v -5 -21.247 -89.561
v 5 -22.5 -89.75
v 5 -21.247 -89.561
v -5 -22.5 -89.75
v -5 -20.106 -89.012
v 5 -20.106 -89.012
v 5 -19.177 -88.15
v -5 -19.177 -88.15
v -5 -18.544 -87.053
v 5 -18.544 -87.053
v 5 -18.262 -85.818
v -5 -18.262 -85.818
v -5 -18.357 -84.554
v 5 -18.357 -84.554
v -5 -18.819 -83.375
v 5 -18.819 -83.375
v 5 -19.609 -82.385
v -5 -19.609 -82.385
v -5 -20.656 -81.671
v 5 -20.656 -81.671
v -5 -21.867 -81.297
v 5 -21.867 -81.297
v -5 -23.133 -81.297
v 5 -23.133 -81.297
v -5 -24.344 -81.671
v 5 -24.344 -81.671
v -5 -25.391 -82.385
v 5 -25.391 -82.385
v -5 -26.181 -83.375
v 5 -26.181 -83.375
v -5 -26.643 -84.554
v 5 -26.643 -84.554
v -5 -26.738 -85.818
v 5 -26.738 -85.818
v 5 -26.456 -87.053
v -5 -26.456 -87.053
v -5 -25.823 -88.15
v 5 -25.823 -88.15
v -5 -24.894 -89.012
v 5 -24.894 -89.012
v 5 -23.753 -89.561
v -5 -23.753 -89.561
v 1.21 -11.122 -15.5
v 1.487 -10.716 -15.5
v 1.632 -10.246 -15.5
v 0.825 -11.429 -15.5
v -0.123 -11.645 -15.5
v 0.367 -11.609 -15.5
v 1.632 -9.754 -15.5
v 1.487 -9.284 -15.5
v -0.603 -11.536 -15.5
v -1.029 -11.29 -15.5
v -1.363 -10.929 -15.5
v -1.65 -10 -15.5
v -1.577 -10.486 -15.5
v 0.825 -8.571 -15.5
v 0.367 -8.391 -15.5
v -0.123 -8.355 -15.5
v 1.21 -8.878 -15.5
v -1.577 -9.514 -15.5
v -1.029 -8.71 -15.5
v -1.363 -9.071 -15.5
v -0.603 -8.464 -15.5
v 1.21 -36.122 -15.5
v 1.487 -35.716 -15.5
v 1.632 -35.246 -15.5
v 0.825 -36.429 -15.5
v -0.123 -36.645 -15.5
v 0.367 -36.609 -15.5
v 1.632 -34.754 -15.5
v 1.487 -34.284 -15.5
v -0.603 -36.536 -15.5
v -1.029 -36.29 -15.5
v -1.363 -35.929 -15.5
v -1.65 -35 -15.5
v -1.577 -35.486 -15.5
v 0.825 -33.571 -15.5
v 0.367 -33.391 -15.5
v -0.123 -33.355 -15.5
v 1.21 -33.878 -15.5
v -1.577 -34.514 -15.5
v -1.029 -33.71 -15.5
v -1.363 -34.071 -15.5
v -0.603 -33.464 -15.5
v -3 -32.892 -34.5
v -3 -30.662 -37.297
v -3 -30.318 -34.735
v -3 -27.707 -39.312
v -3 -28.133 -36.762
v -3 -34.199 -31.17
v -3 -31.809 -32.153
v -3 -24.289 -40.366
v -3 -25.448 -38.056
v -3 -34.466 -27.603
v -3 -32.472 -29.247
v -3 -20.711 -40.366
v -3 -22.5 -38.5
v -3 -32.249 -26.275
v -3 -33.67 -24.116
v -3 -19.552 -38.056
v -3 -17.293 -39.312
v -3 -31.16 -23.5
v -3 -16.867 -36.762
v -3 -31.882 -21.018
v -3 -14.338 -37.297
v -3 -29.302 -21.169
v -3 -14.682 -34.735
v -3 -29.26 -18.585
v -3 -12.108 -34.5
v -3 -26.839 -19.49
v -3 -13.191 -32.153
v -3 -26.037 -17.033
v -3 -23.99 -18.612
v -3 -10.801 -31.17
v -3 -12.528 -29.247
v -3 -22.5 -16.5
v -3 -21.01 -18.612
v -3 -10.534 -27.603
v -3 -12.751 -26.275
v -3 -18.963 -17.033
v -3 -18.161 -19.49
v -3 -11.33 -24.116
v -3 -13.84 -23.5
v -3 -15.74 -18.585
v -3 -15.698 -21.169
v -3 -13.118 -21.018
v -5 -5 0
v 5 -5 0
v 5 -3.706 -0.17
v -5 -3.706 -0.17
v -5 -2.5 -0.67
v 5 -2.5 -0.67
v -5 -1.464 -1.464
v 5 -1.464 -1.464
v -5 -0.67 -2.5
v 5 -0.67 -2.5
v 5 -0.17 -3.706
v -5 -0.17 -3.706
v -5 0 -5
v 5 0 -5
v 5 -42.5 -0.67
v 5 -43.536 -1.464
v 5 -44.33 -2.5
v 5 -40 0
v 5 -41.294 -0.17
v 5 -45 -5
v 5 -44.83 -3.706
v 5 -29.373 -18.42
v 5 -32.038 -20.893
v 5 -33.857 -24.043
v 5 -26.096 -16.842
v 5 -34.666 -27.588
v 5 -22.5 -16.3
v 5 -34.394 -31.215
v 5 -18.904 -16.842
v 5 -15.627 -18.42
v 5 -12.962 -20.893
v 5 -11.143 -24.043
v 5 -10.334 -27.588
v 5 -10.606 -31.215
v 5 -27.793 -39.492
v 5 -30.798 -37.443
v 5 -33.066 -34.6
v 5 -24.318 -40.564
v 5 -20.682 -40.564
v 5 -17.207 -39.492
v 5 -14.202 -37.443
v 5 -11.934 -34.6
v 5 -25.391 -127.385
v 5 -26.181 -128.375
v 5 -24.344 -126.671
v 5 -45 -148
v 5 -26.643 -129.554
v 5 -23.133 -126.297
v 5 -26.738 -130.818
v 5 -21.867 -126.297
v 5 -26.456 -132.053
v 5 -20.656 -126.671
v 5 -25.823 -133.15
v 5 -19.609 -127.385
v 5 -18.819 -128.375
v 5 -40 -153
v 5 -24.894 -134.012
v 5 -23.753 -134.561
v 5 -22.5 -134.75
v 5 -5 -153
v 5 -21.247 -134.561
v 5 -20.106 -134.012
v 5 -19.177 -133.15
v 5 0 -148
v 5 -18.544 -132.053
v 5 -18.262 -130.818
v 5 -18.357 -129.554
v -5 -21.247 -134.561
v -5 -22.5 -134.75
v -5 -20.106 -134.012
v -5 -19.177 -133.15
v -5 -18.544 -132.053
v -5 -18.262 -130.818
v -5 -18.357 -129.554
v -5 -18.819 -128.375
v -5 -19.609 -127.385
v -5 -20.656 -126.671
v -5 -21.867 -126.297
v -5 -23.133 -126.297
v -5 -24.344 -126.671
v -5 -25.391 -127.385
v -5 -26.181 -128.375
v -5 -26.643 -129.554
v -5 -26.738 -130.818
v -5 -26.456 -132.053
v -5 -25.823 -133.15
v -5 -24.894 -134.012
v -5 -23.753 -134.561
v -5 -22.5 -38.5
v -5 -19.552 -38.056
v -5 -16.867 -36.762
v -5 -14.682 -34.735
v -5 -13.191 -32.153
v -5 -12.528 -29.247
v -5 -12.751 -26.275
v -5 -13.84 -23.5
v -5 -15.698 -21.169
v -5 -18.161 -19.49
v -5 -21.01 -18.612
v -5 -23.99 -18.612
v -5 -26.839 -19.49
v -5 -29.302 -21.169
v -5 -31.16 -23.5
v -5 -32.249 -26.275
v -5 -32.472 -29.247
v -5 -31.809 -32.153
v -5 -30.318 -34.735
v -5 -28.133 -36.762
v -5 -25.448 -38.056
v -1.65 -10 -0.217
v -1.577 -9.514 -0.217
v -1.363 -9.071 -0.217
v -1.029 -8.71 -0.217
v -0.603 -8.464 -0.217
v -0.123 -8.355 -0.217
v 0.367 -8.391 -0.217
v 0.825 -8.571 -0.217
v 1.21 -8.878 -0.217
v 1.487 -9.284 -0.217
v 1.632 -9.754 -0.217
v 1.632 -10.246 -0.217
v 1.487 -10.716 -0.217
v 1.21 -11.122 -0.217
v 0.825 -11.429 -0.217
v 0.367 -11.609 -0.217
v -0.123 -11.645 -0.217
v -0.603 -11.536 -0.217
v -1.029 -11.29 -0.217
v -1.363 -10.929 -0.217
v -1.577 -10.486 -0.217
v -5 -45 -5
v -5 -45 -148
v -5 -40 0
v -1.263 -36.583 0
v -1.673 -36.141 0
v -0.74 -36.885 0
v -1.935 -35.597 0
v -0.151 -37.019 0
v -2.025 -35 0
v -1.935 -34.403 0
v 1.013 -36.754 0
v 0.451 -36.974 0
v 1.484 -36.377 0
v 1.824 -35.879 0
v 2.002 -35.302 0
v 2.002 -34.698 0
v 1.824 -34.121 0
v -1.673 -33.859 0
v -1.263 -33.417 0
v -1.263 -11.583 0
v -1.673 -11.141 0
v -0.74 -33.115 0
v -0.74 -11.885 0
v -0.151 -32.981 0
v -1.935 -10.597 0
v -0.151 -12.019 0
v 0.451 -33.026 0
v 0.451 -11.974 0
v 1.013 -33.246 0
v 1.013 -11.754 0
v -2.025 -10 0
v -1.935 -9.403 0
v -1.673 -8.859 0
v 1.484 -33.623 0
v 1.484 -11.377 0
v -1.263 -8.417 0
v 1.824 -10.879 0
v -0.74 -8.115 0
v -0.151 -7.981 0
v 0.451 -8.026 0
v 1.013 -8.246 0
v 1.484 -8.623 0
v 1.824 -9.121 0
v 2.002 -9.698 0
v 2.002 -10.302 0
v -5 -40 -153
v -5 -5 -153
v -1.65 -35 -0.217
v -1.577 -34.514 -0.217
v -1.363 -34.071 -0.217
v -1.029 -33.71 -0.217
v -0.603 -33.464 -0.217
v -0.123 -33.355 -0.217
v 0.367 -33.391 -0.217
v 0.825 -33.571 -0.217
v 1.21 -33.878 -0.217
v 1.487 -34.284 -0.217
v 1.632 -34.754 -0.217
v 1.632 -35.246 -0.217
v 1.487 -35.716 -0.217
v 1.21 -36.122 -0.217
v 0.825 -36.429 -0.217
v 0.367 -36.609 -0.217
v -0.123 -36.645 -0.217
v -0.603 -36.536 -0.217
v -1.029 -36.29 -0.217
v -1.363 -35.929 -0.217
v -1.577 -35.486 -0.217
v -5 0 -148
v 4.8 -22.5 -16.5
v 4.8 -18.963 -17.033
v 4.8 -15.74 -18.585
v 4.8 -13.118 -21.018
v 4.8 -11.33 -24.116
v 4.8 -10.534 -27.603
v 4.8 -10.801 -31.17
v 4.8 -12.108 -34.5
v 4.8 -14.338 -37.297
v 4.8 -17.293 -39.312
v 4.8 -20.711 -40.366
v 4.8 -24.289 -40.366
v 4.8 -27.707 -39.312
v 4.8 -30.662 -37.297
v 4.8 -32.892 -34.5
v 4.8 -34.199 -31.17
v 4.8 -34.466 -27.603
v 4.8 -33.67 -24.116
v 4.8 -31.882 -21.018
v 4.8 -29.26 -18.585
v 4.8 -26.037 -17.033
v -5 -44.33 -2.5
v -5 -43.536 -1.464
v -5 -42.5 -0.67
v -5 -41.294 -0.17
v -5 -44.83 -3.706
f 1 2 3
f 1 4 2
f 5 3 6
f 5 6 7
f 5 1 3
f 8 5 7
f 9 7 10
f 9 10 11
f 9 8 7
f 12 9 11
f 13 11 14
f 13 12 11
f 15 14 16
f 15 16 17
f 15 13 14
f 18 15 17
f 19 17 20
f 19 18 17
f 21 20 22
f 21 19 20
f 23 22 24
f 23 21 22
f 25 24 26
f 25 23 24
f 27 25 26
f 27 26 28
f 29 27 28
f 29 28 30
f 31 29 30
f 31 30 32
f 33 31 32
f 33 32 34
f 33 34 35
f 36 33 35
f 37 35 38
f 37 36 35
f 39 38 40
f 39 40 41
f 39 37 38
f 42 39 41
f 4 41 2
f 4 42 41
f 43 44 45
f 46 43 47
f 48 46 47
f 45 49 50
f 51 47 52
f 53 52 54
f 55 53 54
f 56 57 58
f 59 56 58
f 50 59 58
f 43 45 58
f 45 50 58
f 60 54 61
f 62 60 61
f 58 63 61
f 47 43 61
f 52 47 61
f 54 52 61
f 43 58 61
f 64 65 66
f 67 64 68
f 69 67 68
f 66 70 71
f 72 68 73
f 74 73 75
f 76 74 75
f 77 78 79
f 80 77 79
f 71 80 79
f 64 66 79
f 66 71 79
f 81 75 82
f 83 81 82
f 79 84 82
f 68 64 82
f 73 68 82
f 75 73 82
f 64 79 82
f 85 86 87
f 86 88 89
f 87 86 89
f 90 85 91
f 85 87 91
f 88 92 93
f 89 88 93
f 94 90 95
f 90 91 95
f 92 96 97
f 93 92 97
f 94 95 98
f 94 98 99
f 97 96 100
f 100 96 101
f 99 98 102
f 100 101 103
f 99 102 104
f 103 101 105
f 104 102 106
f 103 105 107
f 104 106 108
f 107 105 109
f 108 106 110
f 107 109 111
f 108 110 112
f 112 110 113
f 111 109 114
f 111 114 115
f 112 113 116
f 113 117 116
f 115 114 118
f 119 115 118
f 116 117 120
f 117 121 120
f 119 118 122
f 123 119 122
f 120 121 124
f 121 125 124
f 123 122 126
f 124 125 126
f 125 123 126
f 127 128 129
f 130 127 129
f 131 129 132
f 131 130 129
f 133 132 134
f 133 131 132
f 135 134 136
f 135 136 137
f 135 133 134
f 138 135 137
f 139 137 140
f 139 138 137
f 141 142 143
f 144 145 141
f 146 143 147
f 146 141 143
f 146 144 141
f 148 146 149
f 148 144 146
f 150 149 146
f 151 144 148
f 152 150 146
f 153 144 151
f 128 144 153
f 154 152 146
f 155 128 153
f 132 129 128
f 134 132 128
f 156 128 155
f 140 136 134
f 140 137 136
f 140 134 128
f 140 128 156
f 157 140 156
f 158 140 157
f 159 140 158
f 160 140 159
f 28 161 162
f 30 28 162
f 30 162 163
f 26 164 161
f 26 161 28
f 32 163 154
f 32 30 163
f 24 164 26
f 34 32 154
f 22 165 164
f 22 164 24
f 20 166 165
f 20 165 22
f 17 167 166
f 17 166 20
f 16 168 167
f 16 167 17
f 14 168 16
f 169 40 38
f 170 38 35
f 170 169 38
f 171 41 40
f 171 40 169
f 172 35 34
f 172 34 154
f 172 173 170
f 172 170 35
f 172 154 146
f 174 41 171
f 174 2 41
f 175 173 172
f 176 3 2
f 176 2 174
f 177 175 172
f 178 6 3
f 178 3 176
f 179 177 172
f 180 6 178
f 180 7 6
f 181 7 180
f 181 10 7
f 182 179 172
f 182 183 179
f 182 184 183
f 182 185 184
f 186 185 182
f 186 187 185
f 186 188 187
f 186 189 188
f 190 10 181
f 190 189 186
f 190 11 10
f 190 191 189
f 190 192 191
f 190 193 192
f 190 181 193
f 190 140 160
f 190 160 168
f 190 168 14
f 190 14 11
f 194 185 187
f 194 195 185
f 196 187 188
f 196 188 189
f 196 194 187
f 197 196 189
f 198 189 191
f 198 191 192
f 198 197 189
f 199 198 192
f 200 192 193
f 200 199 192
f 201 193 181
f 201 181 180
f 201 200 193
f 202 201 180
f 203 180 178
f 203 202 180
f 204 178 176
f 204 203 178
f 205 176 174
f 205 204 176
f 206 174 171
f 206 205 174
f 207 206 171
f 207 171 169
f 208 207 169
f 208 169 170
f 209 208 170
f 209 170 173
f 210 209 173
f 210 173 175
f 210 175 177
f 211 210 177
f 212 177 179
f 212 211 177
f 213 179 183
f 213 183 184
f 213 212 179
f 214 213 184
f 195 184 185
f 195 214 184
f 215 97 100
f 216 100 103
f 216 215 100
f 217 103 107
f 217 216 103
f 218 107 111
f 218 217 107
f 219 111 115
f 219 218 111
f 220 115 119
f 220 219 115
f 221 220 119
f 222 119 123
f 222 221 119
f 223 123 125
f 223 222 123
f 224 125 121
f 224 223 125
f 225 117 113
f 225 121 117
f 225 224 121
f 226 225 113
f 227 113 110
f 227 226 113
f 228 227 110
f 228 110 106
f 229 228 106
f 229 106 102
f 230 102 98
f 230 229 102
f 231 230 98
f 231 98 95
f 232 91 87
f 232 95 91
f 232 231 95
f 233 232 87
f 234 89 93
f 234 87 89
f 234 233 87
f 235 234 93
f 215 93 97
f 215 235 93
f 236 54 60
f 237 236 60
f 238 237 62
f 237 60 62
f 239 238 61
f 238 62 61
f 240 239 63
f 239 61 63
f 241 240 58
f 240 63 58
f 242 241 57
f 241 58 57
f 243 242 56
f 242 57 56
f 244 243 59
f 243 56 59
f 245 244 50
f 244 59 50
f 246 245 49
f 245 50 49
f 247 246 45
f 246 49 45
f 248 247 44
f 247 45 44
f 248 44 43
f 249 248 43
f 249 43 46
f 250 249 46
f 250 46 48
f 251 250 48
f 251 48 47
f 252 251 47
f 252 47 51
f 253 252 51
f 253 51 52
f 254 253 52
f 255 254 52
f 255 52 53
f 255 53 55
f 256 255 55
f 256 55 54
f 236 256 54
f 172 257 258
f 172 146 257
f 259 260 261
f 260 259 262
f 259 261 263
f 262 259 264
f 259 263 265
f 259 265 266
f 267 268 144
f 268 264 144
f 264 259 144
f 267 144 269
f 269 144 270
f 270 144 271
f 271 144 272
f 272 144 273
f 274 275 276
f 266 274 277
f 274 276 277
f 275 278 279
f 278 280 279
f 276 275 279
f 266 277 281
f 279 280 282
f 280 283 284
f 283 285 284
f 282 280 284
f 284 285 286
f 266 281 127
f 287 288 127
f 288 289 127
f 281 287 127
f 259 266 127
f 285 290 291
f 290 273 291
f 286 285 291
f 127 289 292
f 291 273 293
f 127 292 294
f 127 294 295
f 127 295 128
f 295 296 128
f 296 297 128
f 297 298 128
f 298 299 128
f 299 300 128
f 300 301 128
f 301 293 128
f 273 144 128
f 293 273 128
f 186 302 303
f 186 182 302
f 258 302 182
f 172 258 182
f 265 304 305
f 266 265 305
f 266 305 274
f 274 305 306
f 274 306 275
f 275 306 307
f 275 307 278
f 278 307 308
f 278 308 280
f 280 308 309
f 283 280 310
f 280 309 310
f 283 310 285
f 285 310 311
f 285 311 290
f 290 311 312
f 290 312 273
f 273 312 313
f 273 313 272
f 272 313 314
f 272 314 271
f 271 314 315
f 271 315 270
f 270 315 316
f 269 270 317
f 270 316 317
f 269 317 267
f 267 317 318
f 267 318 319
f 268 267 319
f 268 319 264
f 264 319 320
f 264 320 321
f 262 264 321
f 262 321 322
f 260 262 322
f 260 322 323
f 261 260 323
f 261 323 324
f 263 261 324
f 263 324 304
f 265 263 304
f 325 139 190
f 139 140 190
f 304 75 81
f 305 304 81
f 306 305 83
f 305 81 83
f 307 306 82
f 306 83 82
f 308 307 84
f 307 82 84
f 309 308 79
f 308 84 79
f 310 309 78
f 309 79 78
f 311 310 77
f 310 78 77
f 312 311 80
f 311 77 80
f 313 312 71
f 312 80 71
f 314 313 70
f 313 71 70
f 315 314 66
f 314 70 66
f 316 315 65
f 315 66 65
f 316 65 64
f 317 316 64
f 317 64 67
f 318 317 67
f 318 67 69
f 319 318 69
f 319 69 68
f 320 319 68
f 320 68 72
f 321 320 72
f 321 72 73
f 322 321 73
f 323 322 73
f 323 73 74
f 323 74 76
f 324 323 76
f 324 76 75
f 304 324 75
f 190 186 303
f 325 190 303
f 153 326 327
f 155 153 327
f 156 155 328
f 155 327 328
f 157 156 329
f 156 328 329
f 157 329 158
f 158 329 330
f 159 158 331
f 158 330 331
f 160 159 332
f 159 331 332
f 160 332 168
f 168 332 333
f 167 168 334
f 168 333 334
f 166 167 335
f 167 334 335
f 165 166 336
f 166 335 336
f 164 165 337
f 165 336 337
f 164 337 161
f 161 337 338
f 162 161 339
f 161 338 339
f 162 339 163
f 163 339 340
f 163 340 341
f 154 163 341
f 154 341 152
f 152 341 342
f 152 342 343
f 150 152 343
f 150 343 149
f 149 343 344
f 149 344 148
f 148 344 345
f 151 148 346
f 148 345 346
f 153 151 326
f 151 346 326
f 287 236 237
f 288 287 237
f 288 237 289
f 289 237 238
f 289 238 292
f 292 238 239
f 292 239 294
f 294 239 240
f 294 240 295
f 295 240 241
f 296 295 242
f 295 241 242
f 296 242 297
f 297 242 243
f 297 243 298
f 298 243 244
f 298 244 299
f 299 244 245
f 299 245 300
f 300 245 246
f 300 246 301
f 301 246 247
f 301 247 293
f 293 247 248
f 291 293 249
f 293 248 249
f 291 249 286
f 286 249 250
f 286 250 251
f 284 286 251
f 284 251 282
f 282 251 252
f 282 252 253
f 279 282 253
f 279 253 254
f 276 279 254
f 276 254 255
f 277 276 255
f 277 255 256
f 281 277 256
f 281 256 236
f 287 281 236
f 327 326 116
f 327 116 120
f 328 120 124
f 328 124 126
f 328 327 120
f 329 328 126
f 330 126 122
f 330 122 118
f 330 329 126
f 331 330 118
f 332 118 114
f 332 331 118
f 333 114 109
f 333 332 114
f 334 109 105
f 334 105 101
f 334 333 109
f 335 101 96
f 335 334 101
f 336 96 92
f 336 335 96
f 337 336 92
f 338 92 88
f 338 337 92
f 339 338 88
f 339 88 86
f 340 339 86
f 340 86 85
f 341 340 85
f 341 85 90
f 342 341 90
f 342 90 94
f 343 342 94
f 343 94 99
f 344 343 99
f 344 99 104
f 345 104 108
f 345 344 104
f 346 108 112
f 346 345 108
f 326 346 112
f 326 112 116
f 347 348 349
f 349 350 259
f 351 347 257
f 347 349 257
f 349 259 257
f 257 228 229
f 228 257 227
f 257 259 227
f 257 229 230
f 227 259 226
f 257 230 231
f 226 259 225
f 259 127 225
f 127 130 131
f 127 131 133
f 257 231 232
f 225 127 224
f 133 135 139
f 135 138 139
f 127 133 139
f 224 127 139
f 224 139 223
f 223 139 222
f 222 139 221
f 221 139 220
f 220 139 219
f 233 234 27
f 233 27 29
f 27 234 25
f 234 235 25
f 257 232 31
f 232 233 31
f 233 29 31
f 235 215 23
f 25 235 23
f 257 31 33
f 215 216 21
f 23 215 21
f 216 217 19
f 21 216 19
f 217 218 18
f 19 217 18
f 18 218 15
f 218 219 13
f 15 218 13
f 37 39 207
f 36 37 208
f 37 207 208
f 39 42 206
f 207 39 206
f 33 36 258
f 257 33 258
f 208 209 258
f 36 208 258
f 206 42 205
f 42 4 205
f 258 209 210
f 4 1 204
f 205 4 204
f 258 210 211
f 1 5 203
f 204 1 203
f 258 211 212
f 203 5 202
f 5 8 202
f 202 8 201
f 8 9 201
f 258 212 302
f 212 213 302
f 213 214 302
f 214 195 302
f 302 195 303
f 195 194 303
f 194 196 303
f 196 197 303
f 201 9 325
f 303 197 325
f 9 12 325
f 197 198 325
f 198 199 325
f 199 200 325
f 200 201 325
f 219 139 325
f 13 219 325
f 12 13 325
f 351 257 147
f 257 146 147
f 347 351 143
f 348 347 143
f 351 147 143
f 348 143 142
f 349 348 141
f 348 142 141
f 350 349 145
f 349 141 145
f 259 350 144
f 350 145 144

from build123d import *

# Parameters (mm, degrees)
SKETCH_1_W                   = 153
SKETCH_1_H                   = 45
SKETCH_1_R                   = 10
SKETCH_1_R_2                 = 4.25
EXTRUDE_1_DEPTH              = 5
SKETCH_6_R                   = 12
CUT_EXTRUDE_1028_DEPTH       = 8
CHAMFER_1_SIZE               = 5
FILLET_1_R                   = 5
CHAMFER_2_SIZE               = 0.2
HOLE_WIZARD_M4_1_D           = 3.3
HOLE_WIZARD_M4_1_DEPTH       = 15.5
HOLE_WIZARD_M4_1_CSINK_D     = 4.05
HOLE_WIZARD_M4_1_CSINK_ANGLE = 120


with BuildPart() as part:
    # 草图1 → 凸台-拉伸1 (new body, symmetric)
    with BuildSketch(Plane(origin=(0, 0, 0), x_dir=(0, 0, -1), z_dir=(1, 0, 0))):
        with Locations((76.5, -22.5)):
            Rectangle(SKETCH_1_W, SKETCH_1_H)
        with Locations((28.5, -22.5)):
            Circle(SKETCH_1_R, mode=Mode.SUBTRACT)
        with Locations((85.5, -22.5)):
            Circle(SKETCH_1_R_2, mode=Mode.SUBTRACT)
        with Locations((130.5, -22.5)):
            Circle(SKETCH_1_R_2, mode=Mode.SUBTRACT)
    extrude(amount=EXTRUDE_1_DEPTH, both=True)

    # 草图6 → Cut-Extrude 1028 (cut)
    with BuildSketch(Plane.ZY.offset(-5)):
        with Locations((-28.5, -22.5)):
            Circle(SKETCH_6_R)
    extrude(amount=CUT_EXTRUDE_1028_DEPTH, mode=Mode.SUBTRACT)

    # 倒角1
    chamfer_1_edges = [part.edges().sort_by_distance(p)[0] for p in [
        (0, 0, -153),
        (0, -45, -153),
    ]]
    chamfer(chamfer_1_edges, length=CHAMFER_1_SIZE)

    # 圆角1
    fillet_1_edges = [part.edges().sort_by_distance(p)[0] for p in [
        (0, 0, 0),
        (0, -45, 0),
    ]]
    fillet(fillet_1_edges, radius=FILLET_1_R)

    # 倒角2
    chamfer_2_edges = [part.edges().sort_by_distance(p)[0] for p in [
        (5, -22.5, -40.5),
    ]]
    chamfer(chamfer_2_edges, length=CHAMFER_2_SIZE)

    # M4 螺纹孔1
    with Locations(Plane.XY):
        with Locations((0, -10), (0, -35)):
            CounterSinkHole(HOLE_WIZARD_M4_1_D / 2, HOLE_WIZARD_M4_1_CSINK_D / 2, depth=HOLE_WIZARD_M4_1_DEPTH, counter_sink_angle=HOLE_WIZARD_M4_1_CSINK_ANGLE)


solid = part.part
